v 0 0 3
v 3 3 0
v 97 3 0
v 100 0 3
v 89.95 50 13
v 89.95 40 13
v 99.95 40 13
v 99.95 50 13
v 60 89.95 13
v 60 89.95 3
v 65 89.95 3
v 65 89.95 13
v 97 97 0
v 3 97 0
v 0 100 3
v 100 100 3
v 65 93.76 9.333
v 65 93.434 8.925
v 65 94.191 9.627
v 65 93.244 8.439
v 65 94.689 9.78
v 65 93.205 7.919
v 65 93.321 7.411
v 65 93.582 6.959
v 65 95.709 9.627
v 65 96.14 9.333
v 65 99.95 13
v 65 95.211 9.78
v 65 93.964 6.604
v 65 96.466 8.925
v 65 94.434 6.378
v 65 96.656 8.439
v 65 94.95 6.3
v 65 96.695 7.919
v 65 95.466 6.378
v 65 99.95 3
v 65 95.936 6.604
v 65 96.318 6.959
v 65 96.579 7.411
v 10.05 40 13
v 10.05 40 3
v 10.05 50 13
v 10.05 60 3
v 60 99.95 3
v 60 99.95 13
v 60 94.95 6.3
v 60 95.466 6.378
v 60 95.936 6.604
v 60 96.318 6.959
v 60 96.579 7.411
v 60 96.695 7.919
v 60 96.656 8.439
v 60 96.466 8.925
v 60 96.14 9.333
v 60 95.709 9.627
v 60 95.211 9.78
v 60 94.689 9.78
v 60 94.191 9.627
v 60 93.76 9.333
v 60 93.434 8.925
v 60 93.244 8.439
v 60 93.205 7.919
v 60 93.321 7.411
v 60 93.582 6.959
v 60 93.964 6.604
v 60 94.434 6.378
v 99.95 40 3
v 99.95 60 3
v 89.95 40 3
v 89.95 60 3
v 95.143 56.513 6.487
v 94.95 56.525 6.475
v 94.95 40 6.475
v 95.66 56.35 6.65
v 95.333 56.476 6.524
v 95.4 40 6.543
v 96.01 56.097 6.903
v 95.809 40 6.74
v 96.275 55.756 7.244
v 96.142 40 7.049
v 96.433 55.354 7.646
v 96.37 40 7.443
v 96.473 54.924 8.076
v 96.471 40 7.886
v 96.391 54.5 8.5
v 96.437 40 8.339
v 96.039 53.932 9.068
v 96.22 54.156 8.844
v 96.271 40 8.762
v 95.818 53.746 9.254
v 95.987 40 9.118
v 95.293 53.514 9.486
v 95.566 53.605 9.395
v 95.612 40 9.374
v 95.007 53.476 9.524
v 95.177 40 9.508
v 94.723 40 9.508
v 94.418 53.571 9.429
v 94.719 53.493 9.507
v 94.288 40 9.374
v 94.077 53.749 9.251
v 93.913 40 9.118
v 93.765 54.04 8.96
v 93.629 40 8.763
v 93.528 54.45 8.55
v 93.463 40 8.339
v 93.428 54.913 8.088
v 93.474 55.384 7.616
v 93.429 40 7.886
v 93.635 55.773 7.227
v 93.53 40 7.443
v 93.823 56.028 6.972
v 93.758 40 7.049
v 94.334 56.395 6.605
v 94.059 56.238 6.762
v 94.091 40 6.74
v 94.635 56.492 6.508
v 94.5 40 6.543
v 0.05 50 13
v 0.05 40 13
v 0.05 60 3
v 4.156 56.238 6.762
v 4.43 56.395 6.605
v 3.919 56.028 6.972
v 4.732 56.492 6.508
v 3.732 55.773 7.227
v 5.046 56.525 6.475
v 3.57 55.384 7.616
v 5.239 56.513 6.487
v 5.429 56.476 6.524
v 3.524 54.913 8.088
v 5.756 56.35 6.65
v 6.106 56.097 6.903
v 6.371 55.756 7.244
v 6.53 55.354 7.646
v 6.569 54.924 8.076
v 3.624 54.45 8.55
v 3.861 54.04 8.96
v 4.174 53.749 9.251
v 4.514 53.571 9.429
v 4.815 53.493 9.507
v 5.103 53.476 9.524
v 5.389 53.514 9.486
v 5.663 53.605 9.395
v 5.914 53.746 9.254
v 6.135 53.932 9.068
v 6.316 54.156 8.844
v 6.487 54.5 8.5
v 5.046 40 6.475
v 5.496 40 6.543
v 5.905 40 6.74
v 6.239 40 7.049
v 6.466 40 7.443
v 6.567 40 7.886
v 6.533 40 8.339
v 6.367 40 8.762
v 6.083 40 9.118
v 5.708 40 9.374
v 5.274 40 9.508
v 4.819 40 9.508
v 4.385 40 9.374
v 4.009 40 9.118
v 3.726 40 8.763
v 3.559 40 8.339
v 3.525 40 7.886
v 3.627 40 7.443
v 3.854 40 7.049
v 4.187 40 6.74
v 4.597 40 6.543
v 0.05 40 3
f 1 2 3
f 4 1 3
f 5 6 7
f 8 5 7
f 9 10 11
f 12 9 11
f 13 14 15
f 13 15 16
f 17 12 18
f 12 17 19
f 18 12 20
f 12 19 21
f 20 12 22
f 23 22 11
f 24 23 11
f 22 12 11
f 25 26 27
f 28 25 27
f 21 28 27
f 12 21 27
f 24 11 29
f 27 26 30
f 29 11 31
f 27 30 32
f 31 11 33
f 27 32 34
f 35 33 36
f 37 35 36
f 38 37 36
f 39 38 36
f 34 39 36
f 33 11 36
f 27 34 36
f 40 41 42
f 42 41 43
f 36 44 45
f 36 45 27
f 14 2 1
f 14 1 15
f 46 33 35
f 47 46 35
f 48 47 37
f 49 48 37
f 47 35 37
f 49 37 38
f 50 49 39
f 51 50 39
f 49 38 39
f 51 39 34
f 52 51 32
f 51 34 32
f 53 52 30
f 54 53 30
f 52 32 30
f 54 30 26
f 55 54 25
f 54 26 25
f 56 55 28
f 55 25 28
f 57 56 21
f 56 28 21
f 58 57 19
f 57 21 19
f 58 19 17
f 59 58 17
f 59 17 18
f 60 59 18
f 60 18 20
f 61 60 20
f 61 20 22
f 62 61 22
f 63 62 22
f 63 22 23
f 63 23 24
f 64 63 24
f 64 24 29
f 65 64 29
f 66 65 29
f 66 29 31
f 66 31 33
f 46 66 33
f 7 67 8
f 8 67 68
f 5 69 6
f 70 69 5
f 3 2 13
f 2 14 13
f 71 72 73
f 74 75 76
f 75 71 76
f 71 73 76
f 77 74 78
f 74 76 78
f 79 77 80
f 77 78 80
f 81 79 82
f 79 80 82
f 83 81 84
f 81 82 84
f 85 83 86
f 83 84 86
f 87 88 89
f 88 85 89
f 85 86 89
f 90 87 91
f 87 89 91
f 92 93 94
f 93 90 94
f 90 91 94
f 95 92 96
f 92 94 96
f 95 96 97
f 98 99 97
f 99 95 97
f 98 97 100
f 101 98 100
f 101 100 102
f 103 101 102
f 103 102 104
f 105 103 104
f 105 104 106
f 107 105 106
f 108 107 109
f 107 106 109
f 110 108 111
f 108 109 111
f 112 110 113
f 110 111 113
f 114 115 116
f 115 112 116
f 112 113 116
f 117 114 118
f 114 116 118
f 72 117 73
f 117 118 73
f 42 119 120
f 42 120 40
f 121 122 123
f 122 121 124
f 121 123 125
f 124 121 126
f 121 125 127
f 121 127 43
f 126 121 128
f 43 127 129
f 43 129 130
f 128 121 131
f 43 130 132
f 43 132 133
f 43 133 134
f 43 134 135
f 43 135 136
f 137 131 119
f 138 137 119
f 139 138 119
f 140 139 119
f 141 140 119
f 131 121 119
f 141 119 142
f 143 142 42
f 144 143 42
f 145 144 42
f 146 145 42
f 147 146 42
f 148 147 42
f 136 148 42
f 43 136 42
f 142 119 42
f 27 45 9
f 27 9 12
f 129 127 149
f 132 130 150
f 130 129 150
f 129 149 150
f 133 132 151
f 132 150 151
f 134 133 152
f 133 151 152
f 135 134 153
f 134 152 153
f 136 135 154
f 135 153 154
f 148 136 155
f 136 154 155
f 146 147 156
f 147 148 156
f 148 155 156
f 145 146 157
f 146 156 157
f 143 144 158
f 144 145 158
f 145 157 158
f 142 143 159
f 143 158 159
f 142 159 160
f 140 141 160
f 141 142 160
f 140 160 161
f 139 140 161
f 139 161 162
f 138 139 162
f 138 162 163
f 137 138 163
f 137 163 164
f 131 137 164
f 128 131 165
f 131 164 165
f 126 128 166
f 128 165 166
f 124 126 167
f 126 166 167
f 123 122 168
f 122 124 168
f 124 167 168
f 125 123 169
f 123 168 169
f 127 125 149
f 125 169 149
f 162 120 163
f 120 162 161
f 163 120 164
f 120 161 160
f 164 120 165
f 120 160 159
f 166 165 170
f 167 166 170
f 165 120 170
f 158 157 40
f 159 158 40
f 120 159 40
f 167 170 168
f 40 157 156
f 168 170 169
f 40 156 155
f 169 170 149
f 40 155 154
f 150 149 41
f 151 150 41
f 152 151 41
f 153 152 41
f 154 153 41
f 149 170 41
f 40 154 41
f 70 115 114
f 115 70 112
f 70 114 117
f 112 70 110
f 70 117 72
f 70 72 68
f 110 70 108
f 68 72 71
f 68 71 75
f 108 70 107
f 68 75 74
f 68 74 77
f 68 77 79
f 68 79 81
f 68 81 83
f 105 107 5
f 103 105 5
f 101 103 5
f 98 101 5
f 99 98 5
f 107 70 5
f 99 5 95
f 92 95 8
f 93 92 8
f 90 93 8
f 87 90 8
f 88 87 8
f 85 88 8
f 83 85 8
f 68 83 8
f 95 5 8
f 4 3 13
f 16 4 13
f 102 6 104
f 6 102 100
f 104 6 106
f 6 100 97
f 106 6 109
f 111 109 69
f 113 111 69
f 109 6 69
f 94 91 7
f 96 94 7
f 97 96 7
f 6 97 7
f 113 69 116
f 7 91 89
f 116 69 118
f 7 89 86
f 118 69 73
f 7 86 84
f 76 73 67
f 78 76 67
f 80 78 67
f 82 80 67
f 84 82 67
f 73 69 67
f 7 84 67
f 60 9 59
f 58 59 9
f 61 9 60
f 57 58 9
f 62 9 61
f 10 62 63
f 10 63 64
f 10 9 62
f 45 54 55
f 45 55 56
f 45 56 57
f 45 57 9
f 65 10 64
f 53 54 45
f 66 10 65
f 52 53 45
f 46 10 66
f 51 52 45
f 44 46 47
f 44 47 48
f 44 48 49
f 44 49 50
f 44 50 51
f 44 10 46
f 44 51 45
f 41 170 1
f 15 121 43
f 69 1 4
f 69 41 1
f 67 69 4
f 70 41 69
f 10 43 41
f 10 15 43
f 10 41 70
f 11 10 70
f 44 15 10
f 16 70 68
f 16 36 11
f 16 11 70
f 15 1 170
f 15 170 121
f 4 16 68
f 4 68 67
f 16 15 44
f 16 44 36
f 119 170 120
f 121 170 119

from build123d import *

# Parameters (mm, degrees)
ESQUISSE1_W             = 100
ESQUISSE1_H             = 100
BOSS_EXTRU_1_DEPTH      = 3
ESQUISSE2_W             = 10
ESQUISSE2_H             = 20
BOSS_EXTRU_2_DEPTH      = 10
CHANFREIN1_SIZE         = 10
ESQUISSE3_R             = 1.525
ENL_V_MAT_EXTRU_1_DEPTH = 118.3413823
CHANFREIN2_SIZE         = 3
ESQUISSE4_W             = 5
ESQUISSE4_H             = 10
BOSS_EXTRU_3_DEPTH      = 10
ESQUISSE5_R             = 1.75
ENL_V_MAT_EXTRU_2_DEPTH = 10


with BuildPart() as part:
    # Esquisse1 → Boss.-Extru.1 (new body)
    with BuildSketch(Plane.XY):
        with Locations((50, 50)):
            Rectangle(ESQUISSE1_W, ESQUISSE1_H)
    extrude(amount=BOSS_EXTRU_1_DEPTH)

    # Esquisse2 → Boss.-Extru.2 (add)
    with BuildSketch(Plane.XY.offset(3)):
        with Locations((5.05, 50)):
            Rectangle(ESQUISSE2_W, ESQUISSE2_H)
        with Locations((94.95, 50)):
            Rectangle(ESQUISSE2_W, ESQUISSE2_H)
    extrude(amount=BOSS_EXTRU_2_DEPTH)

    # Chanfrein1
    chanfrein1_edges = [part.edges().sort_by_distance(p)[0] for p in [
        (94.95, 60, 13),
        (5.05, 60, 13),
    ]]
    chamfer(chanfrein1_edges, length=CHANFREIN1_SIZE - 0.0001)  # a hair under: the kernel refuses the full size

    # Esquisse3 → Enlèv. mat.-Extru.1 (cut, through all)
    with BuildSketch(Plane.XZ.offset(-40)):
        with Locations(Location((5.046227865, 8, 0), (0, 0, 270))):
            Circle(ESQUISSE3_R)
        with Locations(Location((94.95, 8, 0), (0, 0, 270))):
            Circle(ESQUISSE3_R)
    extrude(amount=-ENL_V_MAT_EXTRU_1_DEPTH, mode=Mode.SUBTRACT)

    # Chanfrein2
    chanfrein2_edges = [part.edges().sort_by_distance(p)[0] for p in [
        (50, 0, 0),
        (100, 50, 0),
        (50, 100, 0),
        (0, 50, 0),
    ]]
    chamfer(chanfrein2_edges, length=CHANFREIN2_SIZE - 0.0001)  # a hair under: the kernel refuses the full size

    # Esquisse4 → Boss.-Extru.3 (add)
    with BuildSketch(Plane.XY.offset(3)):
        with Locations((62.5, 94.95)):
            Rectangle(ESQUISSE4_W, ESQUISSE4_H)
    extrude(amount=BOSS_EXTRU_3_DEPTH)

    # Esquisse5 → Enlèv. mat.-Extru.2 (cut)
    with BuildSketch(Plane(origin=(65, 0, 0), x_dir=(0, 0, -1), z_dir=(1, 0, 0))):
        with Locations((-8.05, 94.95)):
            Circle(ESQUISSE5_R)
    extrude(amount=-ENL_V_MAT_EXTRU_2_DEPTH, mode=Mode.SUBTRACT)


solid = part.part
